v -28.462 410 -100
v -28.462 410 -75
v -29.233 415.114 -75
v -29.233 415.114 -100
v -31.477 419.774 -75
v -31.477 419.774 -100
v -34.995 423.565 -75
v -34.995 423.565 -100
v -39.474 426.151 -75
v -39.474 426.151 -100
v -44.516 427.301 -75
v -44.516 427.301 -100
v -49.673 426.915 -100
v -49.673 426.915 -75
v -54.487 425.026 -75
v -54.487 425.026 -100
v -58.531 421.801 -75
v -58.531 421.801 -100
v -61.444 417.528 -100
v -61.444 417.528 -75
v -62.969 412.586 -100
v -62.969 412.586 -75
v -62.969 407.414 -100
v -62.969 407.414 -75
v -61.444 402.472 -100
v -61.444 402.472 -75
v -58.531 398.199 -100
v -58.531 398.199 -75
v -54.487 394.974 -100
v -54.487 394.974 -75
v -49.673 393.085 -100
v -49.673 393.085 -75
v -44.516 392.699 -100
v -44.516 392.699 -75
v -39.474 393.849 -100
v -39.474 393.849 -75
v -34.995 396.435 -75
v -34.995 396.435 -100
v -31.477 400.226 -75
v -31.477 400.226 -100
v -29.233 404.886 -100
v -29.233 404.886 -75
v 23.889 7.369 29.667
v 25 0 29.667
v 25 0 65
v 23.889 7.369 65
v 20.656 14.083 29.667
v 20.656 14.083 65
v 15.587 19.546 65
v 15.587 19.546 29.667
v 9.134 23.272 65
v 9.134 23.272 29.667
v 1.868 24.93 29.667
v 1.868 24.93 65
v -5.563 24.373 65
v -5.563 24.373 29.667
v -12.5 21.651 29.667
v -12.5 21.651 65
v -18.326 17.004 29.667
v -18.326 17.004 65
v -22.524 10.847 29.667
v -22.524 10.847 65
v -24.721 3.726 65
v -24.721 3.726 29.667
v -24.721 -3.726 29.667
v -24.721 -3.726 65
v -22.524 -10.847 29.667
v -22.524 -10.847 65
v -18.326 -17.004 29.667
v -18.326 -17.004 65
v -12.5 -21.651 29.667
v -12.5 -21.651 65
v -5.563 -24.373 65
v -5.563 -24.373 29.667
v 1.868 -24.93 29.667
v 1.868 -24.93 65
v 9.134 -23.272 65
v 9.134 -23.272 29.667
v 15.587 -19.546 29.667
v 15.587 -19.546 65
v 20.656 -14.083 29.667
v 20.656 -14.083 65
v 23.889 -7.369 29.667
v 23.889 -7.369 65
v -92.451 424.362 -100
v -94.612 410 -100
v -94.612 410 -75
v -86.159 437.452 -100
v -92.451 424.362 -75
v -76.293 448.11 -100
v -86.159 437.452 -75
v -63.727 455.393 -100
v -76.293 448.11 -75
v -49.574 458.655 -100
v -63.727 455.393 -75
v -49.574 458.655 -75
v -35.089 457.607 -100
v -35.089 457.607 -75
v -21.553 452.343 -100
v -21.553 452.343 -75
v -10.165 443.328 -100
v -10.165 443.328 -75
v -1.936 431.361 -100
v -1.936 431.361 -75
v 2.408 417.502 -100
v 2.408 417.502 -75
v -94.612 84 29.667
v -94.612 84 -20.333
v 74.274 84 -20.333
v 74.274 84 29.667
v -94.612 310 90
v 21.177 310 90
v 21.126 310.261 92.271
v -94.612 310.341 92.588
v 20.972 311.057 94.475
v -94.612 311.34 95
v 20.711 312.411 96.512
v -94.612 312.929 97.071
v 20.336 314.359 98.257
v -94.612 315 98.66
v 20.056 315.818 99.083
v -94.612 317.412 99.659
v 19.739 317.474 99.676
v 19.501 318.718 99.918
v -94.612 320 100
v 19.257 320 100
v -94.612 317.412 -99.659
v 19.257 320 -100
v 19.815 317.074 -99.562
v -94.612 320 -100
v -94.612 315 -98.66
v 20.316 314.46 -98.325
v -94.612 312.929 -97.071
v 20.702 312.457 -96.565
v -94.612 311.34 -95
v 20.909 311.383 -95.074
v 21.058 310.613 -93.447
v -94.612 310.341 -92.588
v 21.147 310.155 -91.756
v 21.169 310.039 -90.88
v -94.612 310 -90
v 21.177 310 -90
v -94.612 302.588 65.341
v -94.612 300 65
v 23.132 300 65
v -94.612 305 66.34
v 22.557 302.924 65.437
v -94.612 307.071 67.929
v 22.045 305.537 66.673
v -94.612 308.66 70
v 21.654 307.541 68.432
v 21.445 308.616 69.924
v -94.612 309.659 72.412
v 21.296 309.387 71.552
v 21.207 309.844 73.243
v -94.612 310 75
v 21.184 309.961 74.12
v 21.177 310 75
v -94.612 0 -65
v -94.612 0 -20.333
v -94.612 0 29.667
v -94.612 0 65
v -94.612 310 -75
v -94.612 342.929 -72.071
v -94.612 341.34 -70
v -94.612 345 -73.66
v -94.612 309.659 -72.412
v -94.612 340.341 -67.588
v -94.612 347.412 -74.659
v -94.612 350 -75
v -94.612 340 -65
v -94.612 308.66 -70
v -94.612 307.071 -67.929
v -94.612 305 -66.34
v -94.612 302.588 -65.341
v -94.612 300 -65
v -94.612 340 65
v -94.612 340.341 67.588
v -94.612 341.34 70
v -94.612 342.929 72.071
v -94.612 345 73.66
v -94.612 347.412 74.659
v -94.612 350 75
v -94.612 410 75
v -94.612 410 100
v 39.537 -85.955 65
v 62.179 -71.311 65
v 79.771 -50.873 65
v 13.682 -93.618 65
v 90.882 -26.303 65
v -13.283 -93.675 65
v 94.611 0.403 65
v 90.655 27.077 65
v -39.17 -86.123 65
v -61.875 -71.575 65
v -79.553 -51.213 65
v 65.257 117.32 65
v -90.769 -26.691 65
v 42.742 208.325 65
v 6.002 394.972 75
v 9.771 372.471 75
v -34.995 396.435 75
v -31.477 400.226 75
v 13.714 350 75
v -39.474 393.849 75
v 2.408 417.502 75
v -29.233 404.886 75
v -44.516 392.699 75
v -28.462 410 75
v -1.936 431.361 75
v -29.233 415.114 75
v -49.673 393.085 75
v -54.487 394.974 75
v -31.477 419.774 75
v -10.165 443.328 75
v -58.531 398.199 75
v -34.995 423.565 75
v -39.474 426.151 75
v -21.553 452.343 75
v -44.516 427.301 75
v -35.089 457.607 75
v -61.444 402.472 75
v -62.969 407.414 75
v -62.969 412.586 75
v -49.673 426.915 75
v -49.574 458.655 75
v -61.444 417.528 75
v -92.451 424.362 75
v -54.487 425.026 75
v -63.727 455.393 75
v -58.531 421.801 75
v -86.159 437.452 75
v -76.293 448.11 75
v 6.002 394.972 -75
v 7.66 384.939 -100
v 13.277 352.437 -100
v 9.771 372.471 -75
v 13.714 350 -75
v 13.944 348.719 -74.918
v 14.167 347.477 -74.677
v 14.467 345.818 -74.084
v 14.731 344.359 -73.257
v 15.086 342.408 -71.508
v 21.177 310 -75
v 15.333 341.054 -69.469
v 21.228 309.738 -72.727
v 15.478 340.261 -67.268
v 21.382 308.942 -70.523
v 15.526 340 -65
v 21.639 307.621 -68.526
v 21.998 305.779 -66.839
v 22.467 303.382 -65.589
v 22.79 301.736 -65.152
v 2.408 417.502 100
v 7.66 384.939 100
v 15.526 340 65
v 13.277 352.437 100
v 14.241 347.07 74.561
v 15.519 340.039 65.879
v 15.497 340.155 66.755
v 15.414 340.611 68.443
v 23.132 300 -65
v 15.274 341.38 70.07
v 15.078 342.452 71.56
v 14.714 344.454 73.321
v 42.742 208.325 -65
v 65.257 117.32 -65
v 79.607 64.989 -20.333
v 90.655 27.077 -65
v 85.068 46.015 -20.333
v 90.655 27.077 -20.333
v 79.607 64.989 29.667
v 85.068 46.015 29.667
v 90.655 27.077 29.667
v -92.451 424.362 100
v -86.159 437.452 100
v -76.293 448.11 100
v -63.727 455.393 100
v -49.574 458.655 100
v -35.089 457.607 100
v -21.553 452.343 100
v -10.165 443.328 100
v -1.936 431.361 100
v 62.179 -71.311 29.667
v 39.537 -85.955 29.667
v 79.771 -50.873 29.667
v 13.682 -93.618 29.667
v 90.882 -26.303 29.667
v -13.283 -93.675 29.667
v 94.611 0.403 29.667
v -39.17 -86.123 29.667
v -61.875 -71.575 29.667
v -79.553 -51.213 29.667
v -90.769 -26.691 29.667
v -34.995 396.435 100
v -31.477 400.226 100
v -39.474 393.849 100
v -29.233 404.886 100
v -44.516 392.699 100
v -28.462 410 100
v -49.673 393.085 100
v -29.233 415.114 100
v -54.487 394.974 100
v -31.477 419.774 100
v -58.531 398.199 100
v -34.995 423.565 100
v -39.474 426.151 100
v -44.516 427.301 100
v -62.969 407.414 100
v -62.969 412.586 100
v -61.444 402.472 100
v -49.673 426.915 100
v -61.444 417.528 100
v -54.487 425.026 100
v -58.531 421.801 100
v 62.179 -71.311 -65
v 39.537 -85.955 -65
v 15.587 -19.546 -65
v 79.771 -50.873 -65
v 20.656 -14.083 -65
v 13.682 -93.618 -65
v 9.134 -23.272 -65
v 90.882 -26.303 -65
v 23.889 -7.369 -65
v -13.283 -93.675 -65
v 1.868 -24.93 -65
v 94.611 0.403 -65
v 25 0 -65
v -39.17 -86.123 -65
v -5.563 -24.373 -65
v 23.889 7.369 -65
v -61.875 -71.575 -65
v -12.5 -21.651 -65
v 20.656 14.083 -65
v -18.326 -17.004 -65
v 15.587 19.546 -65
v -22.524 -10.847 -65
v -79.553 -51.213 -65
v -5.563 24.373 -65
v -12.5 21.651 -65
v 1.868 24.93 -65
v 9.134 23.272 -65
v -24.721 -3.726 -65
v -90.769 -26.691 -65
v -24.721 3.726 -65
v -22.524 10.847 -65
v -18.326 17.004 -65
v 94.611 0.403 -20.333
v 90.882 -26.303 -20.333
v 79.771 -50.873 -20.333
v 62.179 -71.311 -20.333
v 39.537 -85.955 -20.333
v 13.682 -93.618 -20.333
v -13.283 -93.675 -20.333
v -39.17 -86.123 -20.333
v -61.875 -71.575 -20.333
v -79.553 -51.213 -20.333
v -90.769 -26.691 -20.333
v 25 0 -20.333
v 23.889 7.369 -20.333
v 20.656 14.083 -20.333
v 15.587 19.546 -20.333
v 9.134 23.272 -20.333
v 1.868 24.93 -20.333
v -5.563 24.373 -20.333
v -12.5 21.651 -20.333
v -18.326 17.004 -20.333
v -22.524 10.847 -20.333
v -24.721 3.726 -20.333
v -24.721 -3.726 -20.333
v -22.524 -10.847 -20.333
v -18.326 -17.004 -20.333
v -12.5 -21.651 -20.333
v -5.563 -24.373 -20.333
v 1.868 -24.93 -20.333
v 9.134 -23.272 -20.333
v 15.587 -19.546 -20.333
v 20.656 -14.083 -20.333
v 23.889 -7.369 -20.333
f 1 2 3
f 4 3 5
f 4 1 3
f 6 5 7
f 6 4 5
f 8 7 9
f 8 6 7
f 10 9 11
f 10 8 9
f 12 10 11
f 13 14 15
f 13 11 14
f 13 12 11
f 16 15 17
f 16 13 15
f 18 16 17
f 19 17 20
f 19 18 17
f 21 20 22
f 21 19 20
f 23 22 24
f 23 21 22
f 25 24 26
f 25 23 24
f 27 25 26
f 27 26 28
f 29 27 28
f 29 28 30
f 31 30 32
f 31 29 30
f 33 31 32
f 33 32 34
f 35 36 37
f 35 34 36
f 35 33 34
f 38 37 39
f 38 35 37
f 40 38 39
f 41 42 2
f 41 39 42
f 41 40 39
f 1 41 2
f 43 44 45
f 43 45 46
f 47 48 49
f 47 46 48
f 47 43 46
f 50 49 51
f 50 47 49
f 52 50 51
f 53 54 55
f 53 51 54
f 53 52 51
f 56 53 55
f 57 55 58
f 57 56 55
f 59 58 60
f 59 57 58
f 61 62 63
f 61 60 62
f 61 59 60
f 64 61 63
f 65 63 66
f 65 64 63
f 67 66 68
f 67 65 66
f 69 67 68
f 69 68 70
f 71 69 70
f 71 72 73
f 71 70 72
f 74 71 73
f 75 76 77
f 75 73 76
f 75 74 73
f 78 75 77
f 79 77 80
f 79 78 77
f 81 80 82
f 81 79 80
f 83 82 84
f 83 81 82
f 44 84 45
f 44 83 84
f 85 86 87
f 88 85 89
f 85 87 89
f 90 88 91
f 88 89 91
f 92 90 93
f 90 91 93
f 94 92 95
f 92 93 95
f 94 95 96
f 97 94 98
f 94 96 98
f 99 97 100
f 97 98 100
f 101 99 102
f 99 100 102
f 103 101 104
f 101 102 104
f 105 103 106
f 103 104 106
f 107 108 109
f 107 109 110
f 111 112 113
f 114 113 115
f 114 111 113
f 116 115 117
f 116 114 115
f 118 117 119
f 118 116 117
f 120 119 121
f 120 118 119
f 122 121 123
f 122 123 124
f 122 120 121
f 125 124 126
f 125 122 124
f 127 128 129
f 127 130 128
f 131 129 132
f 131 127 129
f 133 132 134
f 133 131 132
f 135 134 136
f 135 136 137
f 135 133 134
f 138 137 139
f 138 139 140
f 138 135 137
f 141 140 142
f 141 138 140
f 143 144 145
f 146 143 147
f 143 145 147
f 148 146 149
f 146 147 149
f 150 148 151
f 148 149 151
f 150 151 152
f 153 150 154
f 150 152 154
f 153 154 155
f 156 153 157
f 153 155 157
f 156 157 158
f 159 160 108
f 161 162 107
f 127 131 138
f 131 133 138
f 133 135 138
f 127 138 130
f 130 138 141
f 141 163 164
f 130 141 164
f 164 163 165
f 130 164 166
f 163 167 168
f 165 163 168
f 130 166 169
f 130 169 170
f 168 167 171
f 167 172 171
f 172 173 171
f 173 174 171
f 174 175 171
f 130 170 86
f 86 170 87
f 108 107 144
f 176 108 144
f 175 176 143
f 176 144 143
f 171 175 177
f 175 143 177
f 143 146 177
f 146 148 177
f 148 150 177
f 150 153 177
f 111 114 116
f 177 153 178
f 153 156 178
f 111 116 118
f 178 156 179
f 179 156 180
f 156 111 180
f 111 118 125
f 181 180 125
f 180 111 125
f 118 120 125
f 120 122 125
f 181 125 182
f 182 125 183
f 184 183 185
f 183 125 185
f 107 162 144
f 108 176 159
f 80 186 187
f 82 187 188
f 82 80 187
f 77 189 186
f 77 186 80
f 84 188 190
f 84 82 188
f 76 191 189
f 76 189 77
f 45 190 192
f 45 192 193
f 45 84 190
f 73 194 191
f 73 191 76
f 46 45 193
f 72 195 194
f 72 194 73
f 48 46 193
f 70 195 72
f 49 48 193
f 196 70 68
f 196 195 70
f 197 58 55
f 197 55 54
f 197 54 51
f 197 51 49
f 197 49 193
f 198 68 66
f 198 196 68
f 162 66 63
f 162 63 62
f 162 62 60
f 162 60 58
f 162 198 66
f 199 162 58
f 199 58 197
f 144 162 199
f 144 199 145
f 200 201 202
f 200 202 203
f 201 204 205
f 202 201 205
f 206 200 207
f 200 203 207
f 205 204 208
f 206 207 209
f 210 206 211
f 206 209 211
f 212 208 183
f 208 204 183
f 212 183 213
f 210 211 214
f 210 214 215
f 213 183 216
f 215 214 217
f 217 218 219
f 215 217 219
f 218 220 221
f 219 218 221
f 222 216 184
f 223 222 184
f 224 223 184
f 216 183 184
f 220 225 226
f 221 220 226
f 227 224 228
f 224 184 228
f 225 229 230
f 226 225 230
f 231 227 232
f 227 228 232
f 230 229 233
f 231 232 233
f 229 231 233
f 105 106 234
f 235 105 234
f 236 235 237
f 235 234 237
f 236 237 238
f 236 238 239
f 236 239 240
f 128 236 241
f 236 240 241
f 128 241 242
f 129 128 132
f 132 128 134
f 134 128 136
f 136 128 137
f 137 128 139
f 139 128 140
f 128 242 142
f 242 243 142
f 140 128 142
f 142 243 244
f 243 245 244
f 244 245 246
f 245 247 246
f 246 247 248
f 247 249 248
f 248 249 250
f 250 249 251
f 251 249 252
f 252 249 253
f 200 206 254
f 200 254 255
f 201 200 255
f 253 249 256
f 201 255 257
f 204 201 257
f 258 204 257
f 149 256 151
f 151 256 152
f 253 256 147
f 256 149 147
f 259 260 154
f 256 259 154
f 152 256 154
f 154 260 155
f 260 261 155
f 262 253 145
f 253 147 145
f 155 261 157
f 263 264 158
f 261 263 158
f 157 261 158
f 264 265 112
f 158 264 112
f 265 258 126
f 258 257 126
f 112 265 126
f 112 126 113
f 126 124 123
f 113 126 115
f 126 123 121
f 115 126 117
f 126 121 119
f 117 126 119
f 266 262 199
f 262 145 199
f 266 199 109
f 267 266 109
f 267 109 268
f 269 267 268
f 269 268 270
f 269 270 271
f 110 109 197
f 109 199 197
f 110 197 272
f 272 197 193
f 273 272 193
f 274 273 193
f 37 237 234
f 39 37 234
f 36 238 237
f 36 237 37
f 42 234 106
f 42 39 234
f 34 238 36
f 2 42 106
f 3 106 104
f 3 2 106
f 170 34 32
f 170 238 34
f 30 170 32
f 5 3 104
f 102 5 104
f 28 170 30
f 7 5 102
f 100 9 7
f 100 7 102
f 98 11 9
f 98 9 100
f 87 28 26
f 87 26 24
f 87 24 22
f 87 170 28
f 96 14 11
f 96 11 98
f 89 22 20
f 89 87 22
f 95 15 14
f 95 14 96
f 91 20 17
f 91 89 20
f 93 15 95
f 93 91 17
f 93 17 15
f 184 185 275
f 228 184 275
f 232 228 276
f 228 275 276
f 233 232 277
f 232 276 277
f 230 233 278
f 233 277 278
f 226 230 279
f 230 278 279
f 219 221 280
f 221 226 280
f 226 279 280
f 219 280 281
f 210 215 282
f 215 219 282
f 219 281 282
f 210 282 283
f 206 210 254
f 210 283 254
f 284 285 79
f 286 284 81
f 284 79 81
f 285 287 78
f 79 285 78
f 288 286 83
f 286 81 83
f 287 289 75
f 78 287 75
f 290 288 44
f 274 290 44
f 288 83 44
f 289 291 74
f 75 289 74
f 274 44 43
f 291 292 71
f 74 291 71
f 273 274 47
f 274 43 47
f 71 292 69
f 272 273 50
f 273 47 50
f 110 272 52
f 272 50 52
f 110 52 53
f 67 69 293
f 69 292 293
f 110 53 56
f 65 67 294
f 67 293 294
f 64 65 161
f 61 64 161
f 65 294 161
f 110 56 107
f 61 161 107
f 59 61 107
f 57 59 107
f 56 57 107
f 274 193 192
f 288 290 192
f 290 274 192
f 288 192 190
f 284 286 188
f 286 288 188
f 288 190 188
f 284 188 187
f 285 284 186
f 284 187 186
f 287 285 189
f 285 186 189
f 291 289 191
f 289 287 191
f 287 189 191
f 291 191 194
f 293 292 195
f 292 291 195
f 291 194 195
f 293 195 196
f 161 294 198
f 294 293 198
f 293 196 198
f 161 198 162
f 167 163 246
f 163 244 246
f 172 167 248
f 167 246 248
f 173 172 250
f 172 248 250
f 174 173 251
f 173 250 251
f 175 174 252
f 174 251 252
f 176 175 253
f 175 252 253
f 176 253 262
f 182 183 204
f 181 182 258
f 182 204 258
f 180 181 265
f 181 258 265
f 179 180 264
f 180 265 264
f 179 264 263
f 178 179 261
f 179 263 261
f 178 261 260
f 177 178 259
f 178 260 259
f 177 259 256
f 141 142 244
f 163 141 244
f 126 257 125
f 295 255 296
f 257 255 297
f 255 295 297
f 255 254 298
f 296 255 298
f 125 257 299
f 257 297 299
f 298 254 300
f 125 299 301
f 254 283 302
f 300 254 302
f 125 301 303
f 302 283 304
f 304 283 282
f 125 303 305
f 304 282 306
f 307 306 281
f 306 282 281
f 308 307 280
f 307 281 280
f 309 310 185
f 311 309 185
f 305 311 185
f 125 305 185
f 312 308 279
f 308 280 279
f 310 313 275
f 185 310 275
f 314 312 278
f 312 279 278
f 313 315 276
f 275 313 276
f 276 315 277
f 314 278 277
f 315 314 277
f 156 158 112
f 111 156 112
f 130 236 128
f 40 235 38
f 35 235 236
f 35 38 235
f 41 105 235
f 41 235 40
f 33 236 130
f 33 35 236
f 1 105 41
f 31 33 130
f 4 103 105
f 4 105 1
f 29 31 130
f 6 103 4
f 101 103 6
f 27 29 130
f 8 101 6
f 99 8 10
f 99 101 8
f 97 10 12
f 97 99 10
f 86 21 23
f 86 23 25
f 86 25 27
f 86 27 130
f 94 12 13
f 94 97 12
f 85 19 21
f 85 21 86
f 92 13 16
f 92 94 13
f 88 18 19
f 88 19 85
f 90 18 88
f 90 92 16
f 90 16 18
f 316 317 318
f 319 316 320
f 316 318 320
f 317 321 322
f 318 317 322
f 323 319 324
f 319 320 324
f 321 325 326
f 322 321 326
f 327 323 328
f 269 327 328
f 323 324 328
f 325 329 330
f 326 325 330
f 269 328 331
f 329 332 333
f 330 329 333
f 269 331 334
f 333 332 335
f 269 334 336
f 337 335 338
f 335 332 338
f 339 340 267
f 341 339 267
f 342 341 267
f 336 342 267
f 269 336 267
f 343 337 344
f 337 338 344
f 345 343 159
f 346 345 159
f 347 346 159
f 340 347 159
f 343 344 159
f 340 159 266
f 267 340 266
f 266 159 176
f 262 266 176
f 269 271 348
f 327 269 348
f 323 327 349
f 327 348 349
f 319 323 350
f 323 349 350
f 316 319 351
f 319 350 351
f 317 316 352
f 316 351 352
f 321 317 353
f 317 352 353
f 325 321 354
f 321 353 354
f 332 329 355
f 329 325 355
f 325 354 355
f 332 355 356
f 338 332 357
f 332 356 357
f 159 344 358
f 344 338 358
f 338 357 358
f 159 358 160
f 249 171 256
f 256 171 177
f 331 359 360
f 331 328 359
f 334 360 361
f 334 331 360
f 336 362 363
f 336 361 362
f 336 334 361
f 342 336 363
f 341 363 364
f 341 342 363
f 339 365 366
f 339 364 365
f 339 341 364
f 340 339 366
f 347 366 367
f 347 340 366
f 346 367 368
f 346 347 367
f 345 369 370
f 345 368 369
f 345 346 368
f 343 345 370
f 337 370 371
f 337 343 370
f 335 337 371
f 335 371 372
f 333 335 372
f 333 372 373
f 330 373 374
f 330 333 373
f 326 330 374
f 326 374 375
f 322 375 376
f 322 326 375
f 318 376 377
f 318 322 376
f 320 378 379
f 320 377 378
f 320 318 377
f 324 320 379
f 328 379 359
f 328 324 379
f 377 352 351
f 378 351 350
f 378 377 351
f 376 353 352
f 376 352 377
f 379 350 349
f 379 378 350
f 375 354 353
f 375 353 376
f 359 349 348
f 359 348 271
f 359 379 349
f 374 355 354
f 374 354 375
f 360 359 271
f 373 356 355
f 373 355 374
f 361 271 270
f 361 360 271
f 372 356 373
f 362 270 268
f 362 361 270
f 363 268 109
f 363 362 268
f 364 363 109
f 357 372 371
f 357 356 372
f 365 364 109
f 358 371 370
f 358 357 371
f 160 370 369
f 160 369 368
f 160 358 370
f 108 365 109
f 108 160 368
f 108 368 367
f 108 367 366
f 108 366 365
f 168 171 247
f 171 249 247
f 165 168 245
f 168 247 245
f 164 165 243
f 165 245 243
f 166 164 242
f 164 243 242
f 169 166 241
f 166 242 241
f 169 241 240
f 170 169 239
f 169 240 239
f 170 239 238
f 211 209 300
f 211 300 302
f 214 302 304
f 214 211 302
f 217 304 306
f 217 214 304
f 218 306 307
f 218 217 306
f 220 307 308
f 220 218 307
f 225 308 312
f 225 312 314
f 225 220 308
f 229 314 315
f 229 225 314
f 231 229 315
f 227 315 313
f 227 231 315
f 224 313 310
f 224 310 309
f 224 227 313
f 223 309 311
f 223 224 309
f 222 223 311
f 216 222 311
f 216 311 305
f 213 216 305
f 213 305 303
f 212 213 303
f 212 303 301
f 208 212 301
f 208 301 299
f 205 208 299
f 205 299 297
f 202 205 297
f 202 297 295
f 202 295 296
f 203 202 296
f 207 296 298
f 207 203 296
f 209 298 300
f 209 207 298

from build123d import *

# Parameters (mm, degrees)
SKETCH_1_R          = 25
SKETCH_1_R_2        = 17.35
EXTRUDE_1_DEPTH     = 100
SKETCH_2_W          = 150
SKETCH_2_H          = 163.350102445
SKETCH_2_W_2        = 100.72153761
SKETCH_2_H_2        = 448.495423617
CUT_EXTRUDE_1_DEPTH = 310
SKETCH_3_W          = 50
SKETCH_3_H          = 358.585755847
CUT_EXTRUDE_2_DEPTH = 310
FILLET_1_R          = 10


with BuildPart() as part:
    # 草图1 → 凸台-拉伸1 (new body, symmetric)
    with BuildSketch(Plane.XY):
        with BuildLine():
            Line((-94.612295013, 0), (-94.612295013, 410))
            ThreePointArc((-94.612295013, 410), (-49.57442783, 458.65476705), (2.407637637, 417.501872778))
            ThreePointArc((2.407637637, 417.501872778), (39.895934897, 220.789706501), (90.654933023, 27.07710262))
            ThreePointArc((90.654933023, 27.07710262), (13.682381008, -93.617727048), (-94.612295013, 0))
        make_face()
        Circle(SKETCH_1_R, mode=Mode.SUBTRACT)
        with Locations((-45.812295013, 410)):
            Circle(SKETCH_1_R_2, mode=Mode.SUBTRACT)
    extrude(amount=EXTRUDE_1_DEPTH, both=True)

    # 草图2 → 切除-拉伸1 (cut)
    with BuildSketch(Plane.ZY.offset(94.612295013)):
        with Locations((0, 421.675051222)):
            Rectangle(SKETCH_2_W, SKETCH_2_H)
        with Locations((-115.360768805, 85.752288191)):
            Rectangle(SKETCH_2_W_2, SKETCH_2_H_2)
        with Locations((115.360768805, 85.752288191)):
            Rectangle(SKETCH_2_W_2, SKETCH_2_H_2)
    extrude(amount=-CUT_EXTRUDE_1_DEPTH, mode=Mode.SUBTRACT)

    # 草图3 → 切除-拉伸2 (cut)
    with BuildSketch(Plane.ZY.offset(94.612295013)):
        with Locations((4.667160283, -95.292877924)):
            Rectangle(SKETCH_3_W, SKETCH_3_H)
    extrude(amount=-CUT_EXTRUDE_2_DEPTH, mode=Mode.SUBTRACT)

    # 圆角1
    fillet_1_edges = [part.edges().sort_by_distance(p)[0] for p in [
        (-39.543231053, 340, 75),
        (-39.543231053, 340, -75),
        (-36.717696937, 310, -100),
        (-36.717696937, 310, -65),
        (-36.717696937, 310, 100),
        (-36.717696937, 310, 65),
    ]]
    fillet(fillet_1_edges, radius=FILLET_1_R)


solid = part.part
